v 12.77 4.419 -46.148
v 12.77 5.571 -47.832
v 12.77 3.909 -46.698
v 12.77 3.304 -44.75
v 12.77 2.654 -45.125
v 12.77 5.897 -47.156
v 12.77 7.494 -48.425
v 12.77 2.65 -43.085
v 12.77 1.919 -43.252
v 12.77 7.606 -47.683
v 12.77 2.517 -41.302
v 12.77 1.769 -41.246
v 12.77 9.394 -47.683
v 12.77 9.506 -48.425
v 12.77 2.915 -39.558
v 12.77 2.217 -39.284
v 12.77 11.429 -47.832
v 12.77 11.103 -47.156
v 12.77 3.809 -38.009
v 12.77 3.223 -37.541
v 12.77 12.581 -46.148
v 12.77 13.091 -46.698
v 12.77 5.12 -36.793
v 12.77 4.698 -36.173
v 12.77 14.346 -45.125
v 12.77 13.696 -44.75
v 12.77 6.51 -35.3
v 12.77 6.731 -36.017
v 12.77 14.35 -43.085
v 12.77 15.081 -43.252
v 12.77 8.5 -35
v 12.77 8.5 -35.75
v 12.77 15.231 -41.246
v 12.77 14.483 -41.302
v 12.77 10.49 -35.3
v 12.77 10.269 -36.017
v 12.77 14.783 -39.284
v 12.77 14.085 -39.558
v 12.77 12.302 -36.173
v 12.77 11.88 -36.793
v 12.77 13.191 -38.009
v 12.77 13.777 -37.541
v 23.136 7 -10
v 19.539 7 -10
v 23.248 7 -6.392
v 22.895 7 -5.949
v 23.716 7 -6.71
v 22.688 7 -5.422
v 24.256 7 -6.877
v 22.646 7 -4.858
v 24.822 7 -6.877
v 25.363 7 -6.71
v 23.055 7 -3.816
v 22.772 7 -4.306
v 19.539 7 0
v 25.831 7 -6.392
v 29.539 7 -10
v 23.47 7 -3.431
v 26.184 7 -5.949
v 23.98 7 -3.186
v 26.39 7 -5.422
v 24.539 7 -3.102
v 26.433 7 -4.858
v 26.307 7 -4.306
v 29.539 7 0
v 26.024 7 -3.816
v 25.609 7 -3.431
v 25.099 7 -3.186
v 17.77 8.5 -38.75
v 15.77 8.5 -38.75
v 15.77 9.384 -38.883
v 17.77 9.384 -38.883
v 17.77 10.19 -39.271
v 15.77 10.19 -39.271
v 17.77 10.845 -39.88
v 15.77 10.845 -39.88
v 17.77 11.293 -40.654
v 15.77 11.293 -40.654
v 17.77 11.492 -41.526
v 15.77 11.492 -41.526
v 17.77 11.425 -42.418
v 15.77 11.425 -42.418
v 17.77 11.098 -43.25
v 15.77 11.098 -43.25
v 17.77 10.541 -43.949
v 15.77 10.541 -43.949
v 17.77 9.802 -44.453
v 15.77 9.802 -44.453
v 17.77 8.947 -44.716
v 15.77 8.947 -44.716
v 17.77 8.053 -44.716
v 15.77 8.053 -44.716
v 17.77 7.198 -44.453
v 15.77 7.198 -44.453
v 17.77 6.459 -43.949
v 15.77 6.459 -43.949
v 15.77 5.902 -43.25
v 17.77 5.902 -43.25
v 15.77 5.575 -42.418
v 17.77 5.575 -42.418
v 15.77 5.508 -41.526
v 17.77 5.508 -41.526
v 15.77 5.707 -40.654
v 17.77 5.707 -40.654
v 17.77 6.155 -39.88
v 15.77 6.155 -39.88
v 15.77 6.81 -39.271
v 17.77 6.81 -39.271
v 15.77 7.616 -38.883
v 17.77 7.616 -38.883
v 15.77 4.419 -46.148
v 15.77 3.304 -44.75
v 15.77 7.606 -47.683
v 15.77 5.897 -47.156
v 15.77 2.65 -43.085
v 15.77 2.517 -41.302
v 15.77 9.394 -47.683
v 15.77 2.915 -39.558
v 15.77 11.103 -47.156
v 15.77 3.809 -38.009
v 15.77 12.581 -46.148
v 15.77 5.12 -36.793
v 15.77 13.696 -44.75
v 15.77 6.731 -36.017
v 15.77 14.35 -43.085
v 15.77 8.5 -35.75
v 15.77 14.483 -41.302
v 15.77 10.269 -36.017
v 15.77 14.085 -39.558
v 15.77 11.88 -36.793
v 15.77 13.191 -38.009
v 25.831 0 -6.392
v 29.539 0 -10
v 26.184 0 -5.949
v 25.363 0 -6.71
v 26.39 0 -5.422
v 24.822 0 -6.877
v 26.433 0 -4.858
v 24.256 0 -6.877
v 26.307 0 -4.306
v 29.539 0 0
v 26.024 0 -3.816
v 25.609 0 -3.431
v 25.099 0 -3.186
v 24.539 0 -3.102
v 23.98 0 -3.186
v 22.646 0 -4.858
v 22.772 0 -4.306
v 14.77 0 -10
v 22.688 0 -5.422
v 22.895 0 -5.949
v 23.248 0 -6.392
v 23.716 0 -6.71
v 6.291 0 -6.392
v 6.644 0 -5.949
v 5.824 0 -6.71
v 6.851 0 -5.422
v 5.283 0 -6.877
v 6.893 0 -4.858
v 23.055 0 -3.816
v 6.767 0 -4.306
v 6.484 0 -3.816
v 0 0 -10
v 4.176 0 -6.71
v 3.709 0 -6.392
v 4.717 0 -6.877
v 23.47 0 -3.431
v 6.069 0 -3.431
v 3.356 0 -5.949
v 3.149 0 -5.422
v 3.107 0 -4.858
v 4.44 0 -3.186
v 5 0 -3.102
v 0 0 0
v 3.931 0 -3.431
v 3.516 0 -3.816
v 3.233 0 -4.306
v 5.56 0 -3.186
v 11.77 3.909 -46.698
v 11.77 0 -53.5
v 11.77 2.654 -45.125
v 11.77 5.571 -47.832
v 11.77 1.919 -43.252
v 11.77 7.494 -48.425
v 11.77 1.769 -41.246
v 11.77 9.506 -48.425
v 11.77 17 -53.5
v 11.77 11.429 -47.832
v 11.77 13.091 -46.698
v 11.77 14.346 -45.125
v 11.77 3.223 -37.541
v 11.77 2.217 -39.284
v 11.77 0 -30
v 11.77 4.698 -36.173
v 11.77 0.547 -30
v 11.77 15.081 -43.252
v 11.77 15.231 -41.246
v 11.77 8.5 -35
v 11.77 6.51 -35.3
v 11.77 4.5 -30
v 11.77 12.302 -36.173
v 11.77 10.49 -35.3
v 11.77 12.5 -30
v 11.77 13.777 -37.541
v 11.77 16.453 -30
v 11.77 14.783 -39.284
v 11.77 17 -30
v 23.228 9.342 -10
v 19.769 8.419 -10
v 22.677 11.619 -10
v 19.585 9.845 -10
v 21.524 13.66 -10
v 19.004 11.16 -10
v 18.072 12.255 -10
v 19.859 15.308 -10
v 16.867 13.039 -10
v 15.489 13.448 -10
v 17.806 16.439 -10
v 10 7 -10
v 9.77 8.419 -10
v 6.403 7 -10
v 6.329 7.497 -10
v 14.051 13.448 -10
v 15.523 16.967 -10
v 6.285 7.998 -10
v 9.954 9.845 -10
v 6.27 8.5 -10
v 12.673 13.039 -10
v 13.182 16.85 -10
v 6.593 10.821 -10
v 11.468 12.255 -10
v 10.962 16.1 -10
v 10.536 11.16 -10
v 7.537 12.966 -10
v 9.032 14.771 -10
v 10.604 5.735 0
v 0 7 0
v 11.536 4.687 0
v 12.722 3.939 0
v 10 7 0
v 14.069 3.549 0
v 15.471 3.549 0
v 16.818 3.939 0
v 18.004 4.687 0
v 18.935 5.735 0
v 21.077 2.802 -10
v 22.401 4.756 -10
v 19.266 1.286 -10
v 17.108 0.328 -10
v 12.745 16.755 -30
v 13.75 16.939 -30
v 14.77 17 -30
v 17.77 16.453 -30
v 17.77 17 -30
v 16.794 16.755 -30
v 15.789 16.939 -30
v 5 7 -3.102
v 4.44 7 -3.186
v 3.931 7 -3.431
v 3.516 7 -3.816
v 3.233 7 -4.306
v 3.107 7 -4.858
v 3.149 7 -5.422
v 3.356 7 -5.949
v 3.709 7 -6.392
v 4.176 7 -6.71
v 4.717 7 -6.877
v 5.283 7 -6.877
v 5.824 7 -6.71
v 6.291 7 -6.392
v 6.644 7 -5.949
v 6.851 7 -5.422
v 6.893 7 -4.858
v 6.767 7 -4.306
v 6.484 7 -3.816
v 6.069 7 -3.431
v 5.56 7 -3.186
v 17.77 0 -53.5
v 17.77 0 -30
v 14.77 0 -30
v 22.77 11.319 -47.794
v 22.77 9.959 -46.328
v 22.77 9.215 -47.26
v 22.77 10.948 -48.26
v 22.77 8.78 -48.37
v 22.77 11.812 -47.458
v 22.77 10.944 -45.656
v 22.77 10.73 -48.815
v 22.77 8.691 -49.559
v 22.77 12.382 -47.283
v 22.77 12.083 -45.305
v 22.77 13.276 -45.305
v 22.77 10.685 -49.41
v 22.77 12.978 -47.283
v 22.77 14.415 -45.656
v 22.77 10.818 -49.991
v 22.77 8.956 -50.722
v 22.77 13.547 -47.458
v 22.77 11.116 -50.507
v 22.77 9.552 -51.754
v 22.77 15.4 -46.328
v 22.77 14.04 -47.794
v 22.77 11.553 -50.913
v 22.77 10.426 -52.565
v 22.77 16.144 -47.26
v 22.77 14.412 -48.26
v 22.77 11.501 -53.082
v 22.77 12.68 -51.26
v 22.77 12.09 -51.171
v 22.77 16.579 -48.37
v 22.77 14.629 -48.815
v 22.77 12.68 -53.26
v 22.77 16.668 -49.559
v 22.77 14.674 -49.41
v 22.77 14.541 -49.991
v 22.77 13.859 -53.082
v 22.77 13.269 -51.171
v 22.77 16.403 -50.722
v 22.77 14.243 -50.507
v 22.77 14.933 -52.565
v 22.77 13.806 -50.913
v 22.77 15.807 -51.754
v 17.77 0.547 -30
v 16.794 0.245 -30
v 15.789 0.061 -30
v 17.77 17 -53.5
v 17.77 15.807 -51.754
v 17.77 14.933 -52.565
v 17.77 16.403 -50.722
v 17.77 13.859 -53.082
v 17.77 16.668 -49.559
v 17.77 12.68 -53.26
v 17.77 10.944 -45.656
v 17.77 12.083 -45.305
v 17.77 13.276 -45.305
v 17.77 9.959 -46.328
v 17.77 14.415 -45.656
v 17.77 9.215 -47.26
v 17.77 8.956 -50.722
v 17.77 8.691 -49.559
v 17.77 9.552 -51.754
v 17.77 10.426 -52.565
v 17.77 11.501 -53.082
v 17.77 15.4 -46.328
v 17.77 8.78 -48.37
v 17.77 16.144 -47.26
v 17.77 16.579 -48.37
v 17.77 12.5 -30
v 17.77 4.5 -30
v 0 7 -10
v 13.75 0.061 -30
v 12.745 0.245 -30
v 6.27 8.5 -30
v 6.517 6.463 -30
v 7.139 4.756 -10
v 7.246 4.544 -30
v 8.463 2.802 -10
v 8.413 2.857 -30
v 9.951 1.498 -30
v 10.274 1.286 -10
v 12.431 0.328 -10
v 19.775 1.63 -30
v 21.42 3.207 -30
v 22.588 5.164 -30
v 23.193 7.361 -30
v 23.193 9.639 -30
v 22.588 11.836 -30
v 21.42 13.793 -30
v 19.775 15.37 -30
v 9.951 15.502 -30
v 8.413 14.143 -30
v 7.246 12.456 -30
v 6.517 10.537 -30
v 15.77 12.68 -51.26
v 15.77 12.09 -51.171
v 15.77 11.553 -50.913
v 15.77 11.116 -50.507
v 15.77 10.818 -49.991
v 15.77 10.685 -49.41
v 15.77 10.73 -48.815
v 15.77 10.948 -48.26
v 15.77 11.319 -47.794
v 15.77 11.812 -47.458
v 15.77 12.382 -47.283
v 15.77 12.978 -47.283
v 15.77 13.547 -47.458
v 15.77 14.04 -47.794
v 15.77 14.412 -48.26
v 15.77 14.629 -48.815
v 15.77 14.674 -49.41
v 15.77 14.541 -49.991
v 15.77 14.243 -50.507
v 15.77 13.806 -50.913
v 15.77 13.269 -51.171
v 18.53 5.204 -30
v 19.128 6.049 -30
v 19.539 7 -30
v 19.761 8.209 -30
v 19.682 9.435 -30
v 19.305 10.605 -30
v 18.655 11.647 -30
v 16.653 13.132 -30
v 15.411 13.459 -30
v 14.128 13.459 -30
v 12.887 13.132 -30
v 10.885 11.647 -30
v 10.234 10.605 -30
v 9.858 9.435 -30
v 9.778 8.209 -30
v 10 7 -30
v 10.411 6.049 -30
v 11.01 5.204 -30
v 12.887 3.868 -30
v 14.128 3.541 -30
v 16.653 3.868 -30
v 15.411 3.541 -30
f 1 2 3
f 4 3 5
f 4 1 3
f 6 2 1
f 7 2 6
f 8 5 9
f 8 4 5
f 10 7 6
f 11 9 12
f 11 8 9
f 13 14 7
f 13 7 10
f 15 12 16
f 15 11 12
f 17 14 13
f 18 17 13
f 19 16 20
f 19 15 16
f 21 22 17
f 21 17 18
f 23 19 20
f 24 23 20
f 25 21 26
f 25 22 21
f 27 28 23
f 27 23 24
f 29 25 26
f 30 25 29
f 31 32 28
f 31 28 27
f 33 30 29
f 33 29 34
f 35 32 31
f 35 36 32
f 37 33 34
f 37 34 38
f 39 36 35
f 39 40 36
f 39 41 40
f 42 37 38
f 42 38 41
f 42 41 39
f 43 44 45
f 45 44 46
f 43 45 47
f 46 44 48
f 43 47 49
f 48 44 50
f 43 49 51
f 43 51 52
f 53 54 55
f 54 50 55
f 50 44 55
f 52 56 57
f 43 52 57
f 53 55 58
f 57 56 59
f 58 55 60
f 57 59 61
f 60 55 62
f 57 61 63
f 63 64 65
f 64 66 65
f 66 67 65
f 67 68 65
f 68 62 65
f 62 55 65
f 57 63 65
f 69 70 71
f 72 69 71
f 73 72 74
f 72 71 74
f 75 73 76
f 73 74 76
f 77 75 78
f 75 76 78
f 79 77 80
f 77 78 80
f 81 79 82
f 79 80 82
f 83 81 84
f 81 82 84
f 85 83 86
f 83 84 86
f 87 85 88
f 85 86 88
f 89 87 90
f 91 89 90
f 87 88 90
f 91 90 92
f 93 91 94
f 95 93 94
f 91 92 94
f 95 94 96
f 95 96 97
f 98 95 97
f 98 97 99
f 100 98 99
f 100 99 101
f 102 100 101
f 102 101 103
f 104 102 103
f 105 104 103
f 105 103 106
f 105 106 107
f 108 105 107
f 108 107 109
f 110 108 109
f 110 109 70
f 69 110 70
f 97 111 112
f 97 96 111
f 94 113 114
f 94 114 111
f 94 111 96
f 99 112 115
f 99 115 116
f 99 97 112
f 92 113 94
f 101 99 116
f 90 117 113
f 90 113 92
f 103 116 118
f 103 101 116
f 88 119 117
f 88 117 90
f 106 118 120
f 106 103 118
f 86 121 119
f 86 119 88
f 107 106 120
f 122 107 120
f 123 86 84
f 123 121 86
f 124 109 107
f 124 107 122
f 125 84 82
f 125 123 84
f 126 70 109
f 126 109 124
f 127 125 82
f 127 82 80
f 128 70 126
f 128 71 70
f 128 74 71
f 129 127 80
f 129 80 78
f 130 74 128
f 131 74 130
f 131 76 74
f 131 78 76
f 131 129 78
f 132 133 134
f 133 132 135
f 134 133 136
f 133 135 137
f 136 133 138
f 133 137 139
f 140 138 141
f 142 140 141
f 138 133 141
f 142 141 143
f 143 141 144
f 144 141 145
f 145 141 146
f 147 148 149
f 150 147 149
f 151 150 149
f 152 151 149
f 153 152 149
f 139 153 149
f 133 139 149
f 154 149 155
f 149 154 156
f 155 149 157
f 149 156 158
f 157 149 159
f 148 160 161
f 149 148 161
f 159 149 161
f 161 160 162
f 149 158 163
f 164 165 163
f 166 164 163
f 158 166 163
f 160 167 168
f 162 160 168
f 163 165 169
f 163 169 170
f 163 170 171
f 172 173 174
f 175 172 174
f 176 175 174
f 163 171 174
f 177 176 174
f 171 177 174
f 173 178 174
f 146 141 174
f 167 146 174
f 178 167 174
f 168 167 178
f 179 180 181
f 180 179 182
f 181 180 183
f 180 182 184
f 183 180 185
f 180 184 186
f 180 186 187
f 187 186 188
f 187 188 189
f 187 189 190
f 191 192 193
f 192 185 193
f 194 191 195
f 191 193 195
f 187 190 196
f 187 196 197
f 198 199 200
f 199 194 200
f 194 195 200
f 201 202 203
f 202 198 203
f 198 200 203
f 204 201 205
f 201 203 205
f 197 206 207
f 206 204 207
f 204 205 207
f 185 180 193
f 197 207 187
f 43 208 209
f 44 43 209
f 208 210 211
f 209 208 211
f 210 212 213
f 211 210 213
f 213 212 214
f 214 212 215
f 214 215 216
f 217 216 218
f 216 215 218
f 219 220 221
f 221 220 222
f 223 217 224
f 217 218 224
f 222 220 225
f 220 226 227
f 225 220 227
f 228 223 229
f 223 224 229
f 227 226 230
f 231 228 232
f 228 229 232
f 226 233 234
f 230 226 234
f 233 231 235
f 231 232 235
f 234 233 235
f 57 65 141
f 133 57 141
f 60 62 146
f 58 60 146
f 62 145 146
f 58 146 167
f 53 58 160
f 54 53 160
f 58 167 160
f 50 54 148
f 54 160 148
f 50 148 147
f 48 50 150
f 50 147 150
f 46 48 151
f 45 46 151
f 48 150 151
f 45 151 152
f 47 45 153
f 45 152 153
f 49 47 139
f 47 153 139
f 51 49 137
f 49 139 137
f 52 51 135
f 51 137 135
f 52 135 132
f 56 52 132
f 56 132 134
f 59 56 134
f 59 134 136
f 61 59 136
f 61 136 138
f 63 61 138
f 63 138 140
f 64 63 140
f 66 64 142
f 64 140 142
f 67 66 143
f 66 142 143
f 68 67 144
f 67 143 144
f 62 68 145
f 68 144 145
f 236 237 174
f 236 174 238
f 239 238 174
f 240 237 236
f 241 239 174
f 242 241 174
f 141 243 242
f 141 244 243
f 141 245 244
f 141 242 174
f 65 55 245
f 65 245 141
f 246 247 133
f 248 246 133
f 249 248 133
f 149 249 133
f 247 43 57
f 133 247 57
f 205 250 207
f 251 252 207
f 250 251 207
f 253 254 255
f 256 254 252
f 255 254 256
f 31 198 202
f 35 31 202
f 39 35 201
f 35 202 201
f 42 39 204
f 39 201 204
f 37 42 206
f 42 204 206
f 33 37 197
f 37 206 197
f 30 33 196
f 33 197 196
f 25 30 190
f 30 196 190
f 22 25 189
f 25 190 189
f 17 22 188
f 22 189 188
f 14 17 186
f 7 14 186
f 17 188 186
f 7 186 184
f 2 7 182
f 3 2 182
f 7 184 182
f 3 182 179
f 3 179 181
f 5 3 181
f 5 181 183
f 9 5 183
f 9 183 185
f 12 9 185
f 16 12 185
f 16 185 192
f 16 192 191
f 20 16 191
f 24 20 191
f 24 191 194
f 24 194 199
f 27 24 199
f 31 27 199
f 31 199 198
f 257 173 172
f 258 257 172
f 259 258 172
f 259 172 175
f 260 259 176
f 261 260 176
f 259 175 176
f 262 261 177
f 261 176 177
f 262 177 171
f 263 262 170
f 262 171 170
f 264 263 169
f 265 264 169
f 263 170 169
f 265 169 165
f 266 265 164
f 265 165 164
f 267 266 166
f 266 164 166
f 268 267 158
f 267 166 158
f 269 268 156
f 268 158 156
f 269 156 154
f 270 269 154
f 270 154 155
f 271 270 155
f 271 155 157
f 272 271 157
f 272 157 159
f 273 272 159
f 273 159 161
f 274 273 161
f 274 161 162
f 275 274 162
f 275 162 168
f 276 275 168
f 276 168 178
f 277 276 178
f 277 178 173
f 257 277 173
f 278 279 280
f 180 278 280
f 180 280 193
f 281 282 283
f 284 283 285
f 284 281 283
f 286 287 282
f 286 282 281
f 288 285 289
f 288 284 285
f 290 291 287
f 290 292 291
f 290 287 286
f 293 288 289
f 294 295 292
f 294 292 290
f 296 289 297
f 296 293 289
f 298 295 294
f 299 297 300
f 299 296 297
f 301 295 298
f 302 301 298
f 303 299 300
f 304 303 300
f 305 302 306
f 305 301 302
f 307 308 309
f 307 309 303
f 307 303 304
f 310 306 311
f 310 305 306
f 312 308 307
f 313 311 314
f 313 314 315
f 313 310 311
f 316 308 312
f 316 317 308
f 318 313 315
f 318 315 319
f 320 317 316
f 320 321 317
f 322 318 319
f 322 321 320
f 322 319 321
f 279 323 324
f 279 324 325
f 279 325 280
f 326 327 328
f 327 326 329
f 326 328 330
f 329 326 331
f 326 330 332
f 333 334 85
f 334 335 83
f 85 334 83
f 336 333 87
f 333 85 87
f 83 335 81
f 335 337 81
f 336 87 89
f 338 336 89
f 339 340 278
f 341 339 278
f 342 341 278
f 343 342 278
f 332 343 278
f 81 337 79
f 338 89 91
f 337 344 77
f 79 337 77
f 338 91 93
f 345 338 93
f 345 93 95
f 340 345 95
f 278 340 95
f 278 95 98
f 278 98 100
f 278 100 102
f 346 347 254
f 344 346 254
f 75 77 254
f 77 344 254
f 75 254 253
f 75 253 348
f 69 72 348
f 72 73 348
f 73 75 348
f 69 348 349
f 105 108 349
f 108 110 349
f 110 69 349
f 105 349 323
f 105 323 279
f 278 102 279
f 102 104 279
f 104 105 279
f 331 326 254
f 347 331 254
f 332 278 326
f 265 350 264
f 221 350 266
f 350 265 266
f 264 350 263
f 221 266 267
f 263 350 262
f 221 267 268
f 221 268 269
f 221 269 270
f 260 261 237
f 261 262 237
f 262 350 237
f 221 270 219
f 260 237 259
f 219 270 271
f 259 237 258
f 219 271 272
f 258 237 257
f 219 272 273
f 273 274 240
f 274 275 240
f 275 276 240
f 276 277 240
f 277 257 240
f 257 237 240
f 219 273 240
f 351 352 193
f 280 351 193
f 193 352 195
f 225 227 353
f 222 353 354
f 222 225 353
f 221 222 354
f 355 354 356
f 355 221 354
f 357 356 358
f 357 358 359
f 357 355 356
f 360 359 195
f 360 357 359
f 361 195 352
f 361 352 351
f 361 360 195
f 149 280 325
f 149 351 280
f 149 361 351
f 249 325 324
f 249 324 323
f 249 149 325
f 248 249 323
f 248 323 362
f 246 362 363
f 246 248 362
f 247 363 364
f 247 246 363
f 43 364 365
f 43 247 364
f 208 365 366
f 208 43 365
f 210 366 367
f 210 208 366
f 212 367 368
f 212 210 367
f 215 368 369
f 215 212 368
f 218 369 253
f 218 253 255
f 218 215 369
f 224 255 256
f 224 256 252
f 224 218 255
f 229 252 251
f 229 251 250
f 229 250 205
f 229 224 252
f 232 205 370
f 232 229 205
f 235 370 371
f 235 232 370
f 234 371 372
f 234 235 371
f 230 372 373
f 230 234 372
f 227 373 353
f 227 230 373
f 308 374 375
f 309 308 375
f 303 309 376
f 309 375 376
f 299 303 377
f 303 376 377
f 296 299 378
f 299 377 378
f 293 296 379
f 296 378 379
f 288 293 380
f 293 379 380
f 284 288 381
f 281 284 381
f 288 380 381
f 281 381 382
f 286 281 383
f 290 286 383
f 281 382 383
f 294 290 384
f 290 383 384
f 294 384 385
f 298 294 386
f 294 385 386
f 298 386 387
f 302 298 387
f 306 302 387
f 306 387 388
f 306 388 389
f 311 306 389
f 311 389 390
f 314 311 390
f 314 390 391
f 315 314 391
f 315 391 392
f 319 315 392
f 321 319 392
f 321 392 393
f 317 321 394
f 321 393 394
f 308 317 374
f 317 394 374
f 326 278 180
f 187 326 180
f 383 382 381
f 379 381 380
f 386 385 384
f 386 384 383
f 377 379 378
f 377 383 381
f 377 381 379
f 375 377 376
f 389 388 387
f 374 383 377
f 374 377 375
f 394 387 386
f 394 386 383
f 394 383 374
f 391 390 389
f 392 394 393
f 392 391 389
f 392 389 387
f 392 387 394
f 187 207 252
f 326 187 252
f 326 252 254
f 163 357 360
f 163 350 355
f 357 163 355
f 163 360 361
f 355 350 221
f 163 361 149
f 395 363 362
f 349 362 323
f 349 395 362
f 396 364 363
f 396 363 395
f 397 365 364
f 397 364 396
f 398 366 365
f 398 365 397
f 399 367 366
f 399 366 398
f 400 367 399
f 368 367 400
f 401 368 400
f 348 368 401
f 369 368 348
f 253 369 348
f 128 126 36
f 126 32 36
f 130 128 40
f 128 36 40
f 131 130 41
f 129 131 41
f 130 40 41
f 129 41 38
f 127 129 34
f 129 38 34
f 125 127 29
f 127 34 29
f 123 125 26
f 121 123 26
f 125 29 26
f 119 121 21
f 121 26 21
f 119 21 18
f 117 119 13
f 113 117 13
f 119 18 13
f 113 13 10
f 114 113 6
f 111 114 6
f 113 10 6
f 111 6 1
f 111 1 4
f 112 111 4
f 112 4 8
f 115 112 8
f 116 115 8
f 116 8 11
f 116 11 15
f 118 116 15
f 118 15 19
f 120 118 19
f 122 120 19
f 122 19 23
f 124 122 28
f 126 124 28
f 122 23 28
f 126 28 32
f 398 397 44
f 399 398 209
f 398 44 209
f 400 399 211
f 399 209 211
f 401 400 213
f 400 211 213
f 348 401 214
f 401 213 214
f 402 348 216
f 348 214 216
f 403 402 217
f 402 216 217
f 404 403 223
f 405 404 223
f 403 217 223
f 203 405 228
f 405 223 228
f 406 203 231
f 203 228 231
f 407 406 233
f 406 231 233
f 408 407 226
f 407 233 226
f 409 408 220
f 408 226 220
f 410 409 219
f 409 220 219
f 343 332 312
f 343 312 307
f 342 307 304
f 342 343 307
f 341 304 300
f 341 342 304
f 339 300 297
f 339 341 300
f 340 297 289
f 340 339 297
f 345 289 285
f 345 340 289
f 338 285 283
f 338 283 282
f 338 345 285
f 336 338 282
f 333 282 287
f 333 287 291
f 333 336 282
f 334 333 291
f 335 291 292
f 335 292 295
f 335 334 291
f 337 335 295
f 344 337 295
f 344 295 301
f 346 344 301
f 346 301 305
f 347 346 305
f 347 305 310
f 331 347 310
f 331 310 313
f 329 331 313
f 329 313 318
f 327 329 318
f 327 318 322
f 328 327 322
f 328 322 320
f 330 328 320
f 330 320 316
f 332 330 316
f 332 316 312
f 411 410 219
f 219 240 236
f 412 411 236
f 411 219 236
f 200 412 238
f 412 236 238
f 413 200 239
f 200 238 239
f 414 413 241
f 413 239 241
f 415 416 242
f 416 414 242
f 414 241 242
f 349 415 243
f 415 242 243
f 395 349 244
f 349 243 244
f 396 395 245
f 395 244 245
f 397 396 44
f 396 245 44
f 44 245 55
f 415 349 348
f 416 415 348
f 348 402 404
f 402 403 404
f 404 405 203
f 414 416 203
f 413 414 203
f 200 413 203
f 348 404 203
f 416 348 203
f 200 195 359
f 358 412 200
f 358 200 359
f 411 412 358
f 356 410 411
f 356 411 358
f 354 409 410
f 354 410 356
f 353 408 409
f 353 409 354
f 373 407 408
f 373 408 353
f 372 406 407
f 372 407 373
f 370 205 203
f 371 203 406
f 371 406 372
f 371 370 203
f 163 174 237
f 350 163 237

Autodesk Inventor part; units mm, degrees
ref_plane "YZ Plane" through (0, 0, 0) normal (1, 0, 0) x (0, 1, 0)
ref_plane "XZ Plane" through (0, 0, 0) normal (0, 1, 0) x (-1, 0, 0)
ref_plane "XY Plane" through (0, 0, 0) normal (0, 0, 1) x (1, 0, 0)
sketch "Sketch1" plane through (0, 0, 0) normal (0, 0, 1) x (1, 0, 0)
  line L0 (0, 0) -> (0, 7)
  line L1 (0, 7) -> (10, 7)
  arc A0 (10, 7) -> (19.5394, 7) centre (14.7697, 8.5) ccw
  line L2 (19.5394, 7) -> (29.5394, 7)
  line L3 (29.5394, 7) -> (29.5394, 0)
  line L4 (29.5394, 0) -> (0, 0)
  dimension "d0" = 10
  dimension "d1" = 5
  dimension "d2" = 7
  dimension "d4" = 1.5
extrude "Extrusion1" add sketch "Sketch1" against normal blind 10
sketch "Sketch3" plane through (0, 0, -10) normal (0, 0, -1) x (-1, 0, 0)
  line L0 (0, 0) -> (0, 7) projected
  line L1 (0, 7) -> (-10, 7) projected
  arc A0 (-19.5394, 7) -> (-10, 7) centre (-14.7697, 8.5) ccw projected
  line L2 (-19.5394, 7) -> (-29.5394, 7) projected
  line L3 (-29.5394, 7) -> (-29.5394, 0) projected
  line L4 (-29.5394, 0) -> (0, 0) projected
  circle A1 centre (-14.7697, 8.5) radius 5
  circle A2 centre (-14.7697, 8.5) radius 8.5
  line L5 (-29.5394, 0) -> (0, 0) projected
extrude "Extrusion2" add sketch "Sketch3" along normal blind 20 contours A2 L2 A0 L1 | L1 A1 L2 A2
sketch "Sketch4" plane through (14.7697, 8.5, -30) normal (0, 0, -1) x (-1, 0, 0)
  line L0 (-14.7697, -8.5) -> (14.7697, -8.5) projected
  line L1 (0, -8.5) -> (3, -8.5)
  line L2 (0, -8.5) -> (-3, -8.5)
  circle A0 centre (0, 0) radius 5 projected
  circle A1 centre (0, 0) radius 8.5 projected
  line L3 (-3, -8.5) -> (3, -8.5)
  line L4 (3, -8.5) -> (3, 8.5)
  line L5 (3, 8.5) -> (-3, 8.5)
  line L6 (-3, 8.5) -> (-3, -8.5)
  dimension "d18" = 3
  dimension "d19" = 3
extrude "Extrusion3" add sketch "Sketch4" along normal blind 23.5 contours L6 A1 L0 | A1 L4 L0 | A1 L6 A0 L4 | L6 L5 A1 | A1 L4 A0 L6 | L6 A0 L4 | L5 L4 A1
sketch "Sketch6" plane through (11.7697, 4.5, -30) normal (-1, 0, 0) x (0, 0, 1)
  line L0 (0, 12.5) -> (-23.5, 12.5) projected
  line L1 (-11.75, 12.5) -> (-11.75, 4)
  line L2 (-11.75, 4) -> (-23.5, 4)
  circle A0 centre (-11.75, 4) radius 6.75
  circle A1 centre (-11.75, 4) radius 3
  circle A2 centre (-11.75, 4) radius 6
  point P0 (30, -4.5)
  dimension "d26" = 8.5
  dimension "d27" = 13.5
  dimension "d28" = 6
  dimension "d29" = 12
extrude "Extrusion4" cut sketch "Sketch6" against normal blind 1 contours A0 L2 A2 L1 | L1 A2 L2 A0
extrude "Extrusion5" cut sketch "Sketch6" against normal blind 4 contours A2 L2 A1 L1 | L1 A1 L2 A2
extrude "Extrusion6" cut sketch "Sketch6" against normal up to surface (6 mm away) contours A1 L2 L1 | L1 L2 A1
sketch "Sketch7" plane through (17.7697, 4.5, -30) normal (1, 0, 0) x (0, 0, -1)
  line L0 (11.75, 4) -> (23.5, 4) projected
  circle A0 centre (11.75, 4) radius 6.75 projected
  line L1 (18.5, 4) -> (23.5, 4)
  circle A1 centre (19.2602, 8.1796) radius 2
  circle A2 centre (19.2602, 8.1796) radius 4
  point P0 (-30, -4.5)
  dimension "d40" = 4
  dimension "d41" = 2
extrude "Extrusion7" add sketch "Sketch7" along normal blind 5 contours A2 A0 A1 | A0 A1 A2
extrude "Extrusion8" cut sketch "Sketch7" against normal blind 2 contours A1 A0 | A0 A1
sketch "Sketch8" plane through (0, 7, 0) normal (0, 1, 0) x (1, 0, 0)
  line L0 (0, 0) -> (10, 0) projected
  line L1 (5, 0) -> (5, 10)
  line L2 (0, 10) -> (6.4031, 10) projected
  line L3 (19.5394, 0) -> (29.5394, 0) projected
  line L4 (24.5394, 0) -> (24.5394, 10)
  point P0 (24.5394, 5)
  point P1 (5, 5)
hole "Hole2" at (5, 7, -5) at (24.5394, 7, -5) direction (0, -1, 0) diameter 3.797 end through all clearance for "Flat Head Machine Screw (82)" size "#6" standard "Ansi Unified Screw Threads"
properties part number "frontChassis"
